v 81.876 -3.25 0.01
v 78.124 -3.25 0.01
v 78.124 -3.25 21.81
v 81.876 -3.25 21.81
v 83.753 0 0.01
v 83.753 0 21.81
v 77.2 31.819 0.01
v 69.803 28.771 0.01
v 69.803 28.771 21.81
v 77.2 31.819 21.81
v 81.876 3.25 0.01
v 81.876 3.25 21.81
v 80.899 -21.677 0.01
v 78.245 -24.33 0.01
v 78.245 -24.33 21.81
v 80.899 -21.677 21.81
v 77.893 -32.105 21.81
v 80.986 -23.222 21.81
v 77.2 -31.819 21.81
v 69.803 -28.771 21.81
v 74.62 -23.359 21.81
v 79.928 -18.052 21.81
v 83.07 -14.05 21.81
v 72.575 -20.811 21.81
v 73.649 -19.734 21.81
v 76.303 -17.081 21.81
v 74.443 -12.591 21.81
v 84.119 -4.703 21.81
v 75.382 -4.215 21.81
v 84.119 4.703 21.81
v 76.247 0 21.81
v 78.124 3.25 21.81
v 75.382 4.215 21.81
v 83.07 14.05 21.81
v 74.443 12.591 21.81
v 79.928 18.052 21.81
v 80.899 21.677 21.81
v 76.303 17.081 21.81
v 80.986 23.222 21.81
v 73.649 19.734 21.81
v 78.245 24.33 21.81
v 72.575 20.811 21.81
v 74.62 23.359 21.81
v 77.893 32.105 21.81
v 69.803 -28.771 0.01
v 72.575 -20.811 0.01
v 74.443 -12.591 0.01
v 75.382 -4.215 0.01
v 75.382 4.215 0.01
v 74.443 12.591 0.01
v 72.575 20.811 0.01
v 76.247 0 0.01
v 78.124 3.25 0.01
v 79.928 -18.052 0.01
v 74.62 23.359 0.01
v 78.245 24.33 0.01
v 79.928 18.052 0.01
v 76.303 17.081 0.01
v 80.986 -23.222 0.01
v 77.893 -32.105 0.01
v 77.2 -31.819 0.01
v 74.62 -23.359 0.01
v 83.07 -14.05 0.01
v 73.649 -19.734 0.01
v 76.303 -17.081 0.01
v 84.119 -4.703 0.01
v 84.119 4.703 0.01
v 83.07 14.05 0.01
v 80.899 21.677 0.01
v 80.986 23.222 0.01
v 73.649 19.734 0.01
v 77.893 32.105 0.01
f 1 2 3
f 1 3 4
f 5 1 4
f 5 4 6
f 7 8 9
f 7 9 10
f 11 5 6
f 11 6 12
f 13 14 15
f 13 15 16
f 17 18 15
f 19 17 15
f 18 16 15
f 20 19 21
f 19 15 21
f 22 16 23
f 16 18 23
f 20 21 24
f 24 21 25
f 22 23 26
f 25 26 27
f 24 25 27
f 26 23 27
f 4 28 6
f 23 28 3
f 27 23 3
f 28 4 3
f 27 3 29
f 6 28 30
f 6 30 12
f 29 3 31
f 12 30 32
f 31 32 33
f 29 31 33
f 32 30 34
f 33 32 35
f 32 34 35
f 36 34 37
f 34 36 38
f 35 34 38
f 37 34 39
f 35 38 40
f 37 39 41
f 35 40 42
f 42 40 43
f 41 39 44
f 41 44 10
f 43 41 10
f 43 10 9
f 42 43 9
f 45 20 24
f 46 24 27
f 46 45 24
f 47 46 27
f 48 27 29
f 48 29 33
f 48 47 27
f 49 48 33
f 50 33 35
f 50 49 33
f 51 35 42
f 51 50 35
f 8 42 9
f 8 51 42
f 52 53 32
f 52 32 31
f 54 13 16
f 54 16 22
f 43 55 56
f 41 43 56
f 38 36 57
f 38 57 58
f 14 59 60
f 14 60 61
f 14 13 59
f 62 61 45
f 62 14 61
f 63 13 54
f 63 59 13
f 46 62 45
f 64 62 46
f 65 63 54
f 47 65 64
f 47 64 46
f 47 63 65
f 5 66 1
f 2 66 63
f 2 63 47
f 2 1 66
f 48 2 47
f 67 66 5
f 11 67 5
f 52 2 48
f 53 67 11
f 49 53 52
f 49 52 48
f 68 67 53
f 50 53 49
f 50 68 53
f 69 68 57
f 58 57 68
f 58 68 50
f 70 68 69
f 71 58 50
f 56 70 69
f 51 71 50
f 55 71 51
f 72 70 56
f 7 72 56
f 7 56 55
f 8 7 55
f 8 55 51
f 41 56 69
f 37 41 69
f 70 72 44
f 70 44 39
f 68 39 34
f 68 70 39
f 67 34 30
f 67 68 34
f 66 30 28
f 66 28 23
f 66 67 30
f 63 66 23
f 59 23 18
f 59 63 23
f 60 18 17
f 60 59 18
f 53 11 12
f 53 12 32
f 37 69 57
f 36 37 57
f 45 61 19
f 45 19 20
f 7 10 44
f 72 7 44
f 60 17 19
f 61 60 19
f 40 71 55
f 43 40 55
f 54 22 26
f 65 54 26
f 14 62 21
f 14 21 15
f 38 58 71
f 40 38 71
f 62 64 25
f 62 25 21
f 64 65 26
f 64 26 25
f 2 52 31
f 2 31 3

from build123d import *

# Parameters (mm, degrees)
BOSS_EXTRUDE1_START = 0.01
BOSS_EXTRUDE1_DEPTH = 21.8


with BuildPart() as part:
    # Sketch1 → Boss-Extrude1 (new body)
    with BuildSketch(Plane.XY.offset(BOSS_EXTRUDE1_START)):
        with BuildLine():
            Line((77.199593807, -31.819376425), (69.803225538, -28.770813414))
            ThreePointArc((69.803225538, -28.770813414), (75.5, 0), (69.803225538, 28.770813414))
            Line((69.803225538, 28.770813414), (77.199593807, 31.819376425))
            Line((77.199593807, 31.819376425), (77.893003332, 32.105179208))
            ThreePointArc((77.893003332, 32.105179208), (84.25, 0), (77.893003332, -32.105179208))
            Line((77.893003332, -32.105179208), (77.199593807, -31.819376425))
        make_face()
        Polygon((76.24722325, 0), (78.123611625, -3.25), (81.876388375, -3.25), (83.75277675, 0), (81.876388375, 3.25), (78.123611625, 3.25), align=None, mode=Mode.SUBTRACT)
        Polygon((79.927679991, 18.05190972), (76.302776008, 17.080619625), (73.64916212, 19.734233513), (74.620452215, 23.359137496), (78.245356198, 24.330427591), (80.898970086, 21.676813703), align=None, mode=Mode.SUBTRACT)
        Polygon((74.620452215, -23.359137496), (78.245356198, -24.330427591), (80.898970086, -21.676813703), (79.927679991, -18.05190972), (76.302776008, -17.080619625), (73.64916212, -19.734233513), align=None, mode=Mode.SUBTRACT)
    extrude(amount=BOSS_EXTRUDE1_DEPTH)


solid = part.part
